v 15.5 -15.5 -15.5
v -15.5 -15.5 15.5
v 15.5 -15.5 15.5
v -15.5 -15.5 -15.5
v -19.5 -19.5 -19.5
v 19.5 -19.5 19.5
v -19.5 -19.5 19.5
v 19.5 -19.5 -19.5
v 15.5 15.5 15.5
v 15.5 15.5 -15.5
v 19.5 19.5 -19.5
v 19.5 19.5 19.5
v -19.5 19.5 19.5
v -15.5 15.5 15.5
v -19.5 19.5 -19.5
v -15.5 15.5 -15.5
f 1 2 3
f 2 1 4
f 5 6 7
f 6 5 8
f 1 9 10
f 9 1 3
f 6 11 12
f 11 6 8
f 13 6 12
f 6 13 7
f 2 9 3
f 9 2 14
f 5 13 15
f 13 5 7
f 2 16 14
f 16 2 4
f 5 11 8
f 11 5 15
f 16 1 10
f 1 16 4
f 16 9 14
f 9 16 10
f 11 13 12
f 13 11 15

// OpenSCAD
// file: box.scad
// Display options:

explode = 0; // 3d explosion
front_color = "RoyalBlue";
back_color = "RoyalBlue";
bottom_color = "SlateBlue";
top_color = "SlateBlue";
left_color = "MediumAquamarine";
right_color = "MediumAquamarine";

// Cutting options:

kerf = 0.3; // Kerf width (cuts will be offset by half this)
labels = false;

// Examples:

// box(width = 130, height = 150, depth = 170, thickness = 4);
// box(width = 130, height = 150, depth = 170, thickness = 4, open = true, inset = 8);
// lidbox(width = 130, height = 150, depth = 170, thickness = 4);

// box2d();

// Internals:

e = 0.01;
kc = kerf / 2;

module box(width, height, depth, thickness, finger_width, finger_margin,
	   open = false, inset = 0, assemble = false,
     hole_width = false) {
  w = width;
  h = height;
  d = depth;
  t = thickness;
  hm = h - inset;
  fm = (finger_margin == undef) ? thickness * 2 : finger_margin;
  fw = (finger_width == undef) ? thickness * 2 : finger_width;
  keep_top = !open;

  module left() { cut_left() panel2d(d, h); }
  module right() { cut_right() panel2d(d, h); }
  module top() { cut_top() panel2d(w, d); }
  module bottom() { cut_bottom() panel2d(w, d); }
  module back() { cut_back() panel2d(w, h); }
  module front() { cut_front() panel2d(w, h); }

  module front3d() {
    translate([0,t-explode,0])
      rotate(90, [1,0,0])
      panelize(w,h, "Front", front_color)
      front();
  }

  module back3d() {
    translate([w,d-t+explode,0])
      rotate(-90, [1,0,0])
      rotate(180,[0,0,1])
      panelize(w, h, "Back", back_color)
      back();
  }

  module bottom3d() {
    translate([w,0,t-explode])
      rotate(180,[0,1,0])
      panelize(w, d, "Bottom", bottom_color)
      bottom();
  }

  module top3d() {
    translate([0,0,h-t+explode])
      panelize(w, d, "Top", top_color)
      top();
  }

  module left3d() {
    translate([t-explode,d,0])
      rotate(-90,[0,1,0])
      rotate(-90,[0,0,1])
      panelize(d, h, "Left", left_color)
      left();
  }

  module right3d() {
    translate([w-t+explode,0,0])
      rotate(90,[0,1,0])
      rotate(90,[0,0,1])
      panelize(d, h, "Right", right_color)
      right();
  }

  module box2d() {
    compkerf() front();
    x1 = w + kc * 2 + e;
    translate([x1,0]) compkerf() back();
    x2 = x1 + w + 2 * kc + e;
    translate([x2,0]) compkerf() left();
    x3 = x2 + d + 2 * kc + e;
    translate([x3,0]) compkerf() right();
    y1 = h + kc * 2 + e;
    x4 = 0;
    translate([x4,y1]) compkerf() bottom();
    if (keep_top) {
	 x5 = w + 2 * kc + e;
	 translate([x5,y1]) compkerf() top();
    }
  }

  module box3d() {
    front3d(w, h, d);
    back3d(w, h, d);
    translate([0,0,inset]) bottom3d();
    if (keep_top)
      top3d();
    left3d();
    right3d();
  }

  module cut_front() {
    difference() {
      children();
      translate([0,inset]) cuts(w);
      if (keep_top) movecutstop(w, h) cuts(w);
      movecutsleft(w, h) cuts(h);
      movecutsright(w, h) cuts(h);
      if (hole_width) {
	   r = hole_height / 2;
	   hull() {
		translate([w/2 - hole_width/2 + r, h - hole_margin - r])
		     circle(r = r);
		translate([w/2 + hole_width/2 - r, h - hole_margin - r])
		     circle(r = r);
	   }
      }
    }
  }

  module cut_top() {
    difference() {
      children();
      invcuts(w);
      movecutstop(w, d) invcuts(w);
      movecutsleft(w, d) translate([t,0]) invcuts(d-2*t);
      movecutsright(w, d) translate([t,0]) invcuts(d-2*t);
    }
  }

  module cut_left() {
    difference() {
      children();
      translate([t,inset]) cuts(d-2*t);
      if (keep_top) movecutstop(d, h) translate([t,0]) cuts(d-2*t);
      movecutsleft(d, h) invcuts(h);
      movecutsright(d, h) invcuts(h);
    }
  }

  module cut_bottom() { cut_top() children(); }
  module cut_right() { cut_left() children(); }
  module cut_back() { cut_front() children(); }

  module cuts(tw, li = 0, ri = 0) {
    w = tw - li - ri;
    innerw = w - t*2 - 2 * fm;
    tc1 = floor((innerw / fw - 1) / 2);
    tc = (tc1 < 0) ? 0 : tc1;
    steps = tc * 2 + 1;

    fw_fitting = innerw / steps;

    // Use a default finger if we cant fit one within margins
    fw1 = (innerw < fw) ? fw : fw_fitting;
    // Divide length by 3 if we can fit less that 3 fingers
    fw2 = (tw < fw * 3) ? (tw / 3) : fw1;

    stepsize = fw2;

    x = (w - steps * stepsize) / 2;
    fw_minimum = t;

    if (tw >= 3 * fw_minimum) {
      translate([li,0])
	for (i = [0:tc]) {
	  translate([x+i*stepsize*2,-e])
	    square([stepsize, t+e]);
	}
    }
  }

  module movecutstop(w, h) {
    translate([w,h,0])
      rotate(180,[0,0,1])
      children();
  }

  module movecutsleft(w, h) {
    translate([0, h/2])
      rotate(-90, [0,0,1])
      translate([-h/2,0])
      children();
  }

  module movecutsright(w, h) {
    translate([w-t,0])
      rotate(90,[0,0,1])
      translate([0,-t])
      children();
  }

  module invcuts(w, li = 0, ri = 0) {
    difference() {
      translate([-2*e,-e]) square([w+4*e,t+e]);
      cuts(w, li, ri);
    }
  }

  module panelize(x, y, name, cl) {
    color(cl)
      linear_extrude(height = t)
	 children();
    if (labels) {
	 color("Yellow")
	      translate([x/2,y/2,t+1])
	      text(text = name, halign = "center", valign="center");
    }
  }

  module panel2d(x, y) {
    square([x,y]);
  }

  if (assemble)
    box3d();
  else
    box2d();
}


// Kerf compensation modifier
module compkerf() { offset(delta = kc) children(); }
// main file
include <box.scad>

size = 4*3.5 + 25 + 30 * sin($t * 360);
translate([-size/2, -size/2, -size/2])
box(width =  size,
    height = size,
    depth =  size, thickness = 4,
    assemble = true);
